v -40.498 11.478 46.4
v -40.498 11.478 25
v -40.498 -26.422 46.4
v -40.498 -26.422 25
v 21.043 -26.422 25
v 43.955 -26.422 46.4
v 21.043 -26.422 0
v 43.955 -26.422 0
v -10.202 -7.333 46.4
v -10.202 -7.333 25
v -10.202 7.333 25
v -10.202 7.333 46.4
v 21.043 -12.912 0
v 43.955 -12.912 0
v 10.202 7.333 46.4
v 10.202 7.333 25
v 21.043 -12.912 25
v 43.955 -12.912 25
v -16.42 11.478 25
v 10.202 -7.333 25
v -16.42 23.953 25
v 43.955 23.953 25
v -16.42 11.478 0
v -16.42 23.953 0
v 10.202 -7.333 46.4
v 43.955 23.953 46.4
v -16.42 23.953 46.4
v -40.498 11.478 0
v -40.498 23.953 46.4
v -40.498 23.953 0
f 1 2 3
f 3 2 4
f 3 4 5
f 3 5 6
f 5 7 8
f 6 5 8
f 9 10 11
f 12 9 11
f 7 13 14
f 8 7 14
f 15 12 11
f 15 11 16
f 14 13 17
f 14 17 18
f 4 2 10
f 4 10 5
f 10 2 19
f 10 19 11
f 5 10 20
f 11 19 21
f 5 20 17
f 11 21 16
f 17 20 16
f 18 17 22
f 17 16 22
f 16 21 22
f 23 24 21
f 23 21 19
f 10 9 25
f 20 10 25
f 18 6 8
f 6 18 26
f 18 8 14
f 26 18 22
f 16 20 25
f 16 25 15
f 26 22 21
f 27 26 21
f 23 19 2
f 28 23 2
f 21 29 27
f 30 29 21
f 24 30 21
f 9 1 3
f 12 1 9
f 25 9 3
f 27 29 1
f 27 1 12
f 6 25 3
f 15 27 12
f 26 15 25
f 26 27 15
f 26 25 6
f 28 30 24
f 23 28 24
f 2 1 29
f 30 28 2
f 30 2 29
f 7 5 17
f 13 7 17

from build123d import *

# Parameters (mm, degrees)
F0_W     = 24.078095
F0_H     = 12.475135
F0_W_2   = 22.912228
F0_H_2   = 13.509782
F0_W_3   = 20.404858
F0_H_3   = 14.665992
F1_DEPTH = 46.4
F2_DEPTH = 25


with BuildPart() as f1:
    # F0 (on Top) → F1 (new body)
    with BuildSketch(Plane.XY):
        with Locations((-28.458583, 17.7153)):
            Rectangle(F0_W, F0_H)
        with Locations((32.498623, -19.66734)):
            Rectangle(F0_W_2, F0_H_2)
        Polygon((43.954737, 23.952868), (-16.419536, 23.952868), (-16.419536, 11.477733), (-40.497631, 11.477733), (-40.497631, -26.422231), (21.042509, -26.422231), (21.042509, -12.912449), (43.954737, -12.912449), align=None)
        Rectangle(F0_W_3, F0_H_3, mode=Mode.SUBTRACT)
    extrude(amount=F1_DEPTH)

    # F0 (on Top) → F2 (cut)
    with BuildSketch(Plane.XY):
        Polygon((43.954737, 23.952868), (-16.419536, 23.952868), (-16.419536, 11.477733), (-40.497631, 11.477733), (-40.497631, -26.422231), (21.042509, -26.422231), (21.042509, -12.912449), (43.954737, -12.912449), align=None)
        Rectangle(F0_W_3, F0_H_3, mode=Mode.SUBTRACT)
    extrude(amount=F2_DEPTH, mode=Mode.SUBTRACT)


solid = f1.part
